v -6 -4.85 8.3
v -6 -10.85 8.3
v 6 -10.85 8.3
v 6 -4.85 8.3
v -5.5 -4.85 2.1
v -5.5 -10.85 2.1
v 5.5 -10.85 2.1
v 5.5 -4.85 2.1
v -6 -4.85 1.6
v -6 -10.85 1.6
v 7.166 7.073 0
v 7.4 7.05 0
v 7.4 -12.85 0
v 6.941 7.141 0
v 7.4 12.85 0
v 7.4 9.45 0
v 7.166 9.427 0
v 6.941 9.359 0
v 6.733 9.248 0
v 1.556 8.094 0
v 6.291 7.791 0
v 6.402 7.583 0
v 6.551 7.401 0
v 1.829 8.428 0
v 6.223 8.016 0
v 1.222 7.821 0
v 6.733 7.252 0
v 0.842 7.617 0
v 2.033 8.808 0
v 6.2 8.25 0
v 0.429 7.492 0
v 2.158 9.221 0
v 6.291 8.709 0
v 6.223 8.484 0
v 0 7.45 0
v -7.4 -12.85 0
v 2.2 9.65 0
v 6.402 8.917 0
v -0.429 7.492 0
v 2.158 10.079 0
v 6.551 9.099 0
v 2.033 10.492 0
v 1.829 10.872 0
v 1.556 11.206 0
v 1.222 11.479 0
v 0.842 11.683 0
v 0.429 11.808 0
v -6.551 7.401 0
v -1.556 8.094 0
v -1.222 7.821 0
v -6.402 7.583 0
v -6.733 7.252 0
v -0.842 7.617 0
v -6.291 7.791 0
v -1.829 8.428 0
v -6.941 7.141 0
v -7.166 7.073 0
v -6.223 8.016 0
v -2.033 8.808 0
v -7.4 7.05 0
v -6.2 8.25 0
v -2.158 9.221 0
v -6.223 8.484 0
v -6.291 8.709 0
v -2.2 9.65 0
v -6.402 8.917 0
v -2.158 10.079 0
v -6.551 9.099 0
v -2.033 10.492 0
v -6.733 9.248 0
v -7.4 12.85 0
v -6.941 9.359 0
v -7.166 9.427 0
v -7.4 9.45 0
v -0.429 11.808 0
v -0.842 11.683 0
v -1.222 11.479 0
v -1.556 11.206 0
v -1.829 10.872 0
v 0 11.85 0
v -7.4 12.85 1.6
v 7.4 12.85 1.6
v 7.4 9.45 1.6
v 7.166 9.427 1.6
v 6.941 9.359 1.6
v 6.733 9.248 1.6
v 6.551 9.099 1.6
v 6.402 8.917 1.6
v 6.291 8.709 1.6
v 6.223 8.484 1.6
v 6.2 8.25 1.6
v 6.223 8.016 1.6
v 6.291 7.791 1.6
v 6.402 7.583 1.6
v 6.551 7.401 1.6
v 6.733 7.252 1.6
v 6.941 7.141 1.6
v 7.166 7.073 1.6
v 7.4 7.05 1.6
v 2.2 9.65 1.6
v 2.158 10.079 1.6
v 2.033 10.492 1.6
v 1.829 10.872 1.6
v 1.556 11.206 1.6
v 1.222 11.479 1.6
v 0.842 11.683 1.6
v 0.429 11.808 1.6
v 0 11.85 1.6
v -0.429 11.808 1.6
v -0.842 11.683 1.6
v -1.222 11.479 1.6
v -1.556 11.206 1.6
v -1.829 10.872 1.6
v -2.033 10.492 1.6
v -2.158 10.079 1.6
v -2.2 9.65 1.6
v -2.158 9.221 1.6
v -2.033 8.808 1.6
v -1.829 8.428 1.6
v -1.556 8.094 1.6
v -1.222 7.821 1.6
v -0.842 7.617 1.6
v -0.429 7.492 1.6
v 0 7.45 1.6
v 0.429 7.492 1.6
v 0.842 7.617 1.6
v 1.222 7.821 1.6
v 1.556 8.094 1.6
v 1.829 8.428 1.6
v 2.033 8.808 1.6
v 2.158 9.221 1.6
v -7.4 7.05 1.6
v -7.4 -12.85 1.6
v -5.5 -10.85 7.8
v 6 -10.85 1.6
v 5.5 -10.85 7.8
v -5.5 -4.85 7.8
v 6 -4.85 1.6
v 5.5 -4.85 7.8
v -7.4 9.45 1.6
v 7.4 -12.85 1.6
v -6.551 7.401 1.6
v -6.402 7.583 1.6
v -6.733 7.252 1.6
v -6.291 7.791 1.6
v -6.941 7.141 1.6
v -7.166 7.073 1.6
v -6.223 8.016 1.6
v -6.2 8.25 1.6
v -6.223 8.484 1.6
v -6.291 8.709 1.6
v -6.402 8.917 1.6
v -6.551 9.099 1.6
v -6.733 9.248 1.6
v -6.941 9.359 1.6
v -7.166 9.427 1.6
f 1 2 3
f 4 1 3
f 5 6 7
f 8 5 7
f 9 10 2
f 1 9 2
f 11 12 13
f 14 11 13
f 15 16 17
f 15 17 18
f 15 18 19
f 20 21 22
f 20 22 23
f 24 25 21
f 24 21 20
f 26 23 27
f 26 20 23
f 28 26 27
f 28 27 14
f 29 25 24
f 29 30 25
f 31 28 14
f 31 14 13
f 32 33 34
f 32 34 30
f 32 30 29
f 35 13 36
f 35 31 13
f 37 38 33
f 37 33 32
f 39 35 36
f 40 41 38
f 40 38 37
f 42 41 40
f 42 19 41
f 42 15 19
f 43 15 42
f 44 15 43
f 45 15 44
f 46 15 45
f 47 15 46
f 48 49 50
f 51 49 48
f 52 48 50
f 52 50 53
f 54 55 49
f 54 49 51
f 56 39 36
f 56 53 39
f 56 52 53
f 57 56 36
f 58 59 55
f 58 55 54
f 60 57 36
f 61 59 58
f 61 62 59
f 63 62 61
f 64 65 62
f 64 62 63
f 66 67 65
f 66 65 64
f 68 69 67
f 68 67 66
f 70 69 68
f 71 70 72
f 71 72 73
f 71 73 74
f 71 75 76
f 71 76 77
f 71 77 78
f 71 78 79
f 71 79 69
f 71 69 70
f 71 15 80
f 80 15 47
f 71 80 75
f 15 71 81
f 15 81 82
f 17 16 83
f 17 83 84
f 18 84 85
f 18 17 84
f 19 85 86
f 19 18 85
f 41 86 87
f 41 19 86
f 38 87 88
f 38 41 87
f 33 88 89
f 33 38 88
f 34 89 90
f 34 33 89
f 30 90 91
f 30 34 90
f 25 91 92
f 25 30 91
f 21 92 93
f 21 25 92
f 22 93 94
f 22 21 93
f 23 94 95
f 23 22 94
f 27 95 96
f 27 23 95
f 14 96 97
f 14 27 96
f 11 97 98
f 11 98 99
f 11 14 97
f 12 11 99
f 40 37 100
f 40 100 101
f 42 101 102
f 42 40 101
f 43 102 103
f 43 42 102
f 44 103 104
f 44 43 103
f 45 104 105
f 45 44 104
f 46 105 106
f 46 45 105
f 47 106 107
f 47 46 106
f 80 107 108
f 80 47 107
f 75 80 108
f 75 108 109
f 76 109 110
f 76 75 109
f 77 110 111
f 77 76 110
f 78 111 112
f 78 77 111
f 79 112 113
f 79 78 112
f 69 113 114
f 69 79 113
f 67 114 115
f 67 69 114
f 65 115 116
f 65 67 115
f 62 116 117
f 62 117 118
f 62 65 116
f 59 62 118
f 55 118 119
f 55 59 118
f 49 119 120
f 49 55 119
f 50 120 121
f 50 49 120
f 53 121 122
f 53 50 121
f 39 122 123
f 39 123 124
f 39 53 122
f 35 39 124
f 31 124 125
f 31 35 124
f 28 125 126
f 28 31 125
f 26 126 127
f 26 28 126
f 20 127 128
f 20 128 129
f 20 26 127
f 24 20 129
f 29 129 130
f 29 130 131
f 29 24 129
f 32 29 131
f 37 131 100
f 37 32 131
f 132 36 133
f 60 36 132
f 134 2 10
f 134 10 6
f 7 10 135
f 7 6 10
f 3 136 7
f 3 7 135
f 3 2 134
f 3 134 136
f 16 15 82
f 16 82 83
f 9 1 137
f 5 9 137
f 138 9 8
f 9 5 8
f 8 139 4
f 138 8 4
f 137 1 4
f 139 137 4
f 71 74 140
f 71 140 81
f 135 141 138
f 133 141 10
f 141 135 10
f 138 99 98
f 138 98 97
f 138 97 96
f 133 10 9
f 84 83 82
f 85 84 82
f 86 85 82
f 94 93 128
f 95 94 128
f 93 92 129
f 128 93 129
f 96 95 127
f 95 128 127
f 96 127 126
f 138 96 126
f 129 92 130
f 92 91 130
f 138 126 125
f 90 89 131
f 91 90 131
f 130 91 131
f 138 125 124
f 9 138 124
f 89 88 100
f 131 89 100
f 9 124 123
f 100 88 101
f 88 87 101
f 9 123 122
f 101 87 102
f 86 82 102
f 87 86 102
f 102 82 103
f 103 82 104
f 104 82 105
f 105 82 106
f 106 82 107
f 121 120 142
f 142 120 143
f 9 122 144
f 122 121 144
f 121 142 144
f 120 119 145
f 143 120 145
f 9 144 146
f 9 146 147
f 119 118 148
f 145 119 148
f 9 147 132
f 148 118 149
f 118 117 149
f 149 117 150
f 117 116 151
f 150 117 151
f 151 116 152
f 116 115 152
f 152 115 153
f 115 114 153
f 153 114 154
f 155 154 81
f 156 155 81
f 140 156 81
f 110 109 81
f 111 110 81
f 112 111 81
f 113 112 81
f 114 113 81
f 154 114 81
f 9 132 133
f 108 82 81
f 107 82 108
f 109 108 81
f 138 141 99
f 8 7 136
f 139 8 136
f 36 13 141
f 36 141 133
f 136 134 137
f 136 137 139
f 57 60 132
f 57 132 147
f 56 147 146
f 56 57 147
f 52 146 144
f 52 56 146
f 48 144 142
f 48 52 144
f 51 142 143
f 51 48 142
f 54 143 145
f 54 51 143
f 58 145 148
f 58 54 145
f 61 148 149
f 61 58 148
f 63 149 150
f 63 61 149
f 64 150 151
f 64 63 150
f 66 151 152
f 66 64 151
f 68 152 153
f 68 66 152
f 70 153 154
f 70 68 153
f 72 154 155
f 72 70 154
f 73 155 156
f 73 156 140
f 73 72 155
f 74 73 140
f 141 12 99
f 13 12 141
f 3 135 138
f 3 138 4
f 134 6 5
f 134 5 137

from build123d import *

# Parameters (mm, degrees)
CROQUIS1_R              = 2.2
SALIENTE_EXTRUIR1_DEPTH = 1.6
SALIENTE_EXTRUIR3_START = -2
CROQUIS3_W              = 12
CROQUIS3_H              = 6.7
CROQUIS3_W_2            = 11
CROQUIS3_H_2            = 5.7
SALIENTE_EXTRUIR3_DEPTH = 6


with BuildPart() as part:
    # Croquis1 → Saliente-Extruir1 (new body)
    with BuildSketch(Plane.XY):
        with BuildLine():
            Line((7.4, -12.85), (-7.4, -12.85))
            Line((-7.4, -12.85), (-7.4, 7.05))
            ThreePointArc((-7.4, 7.05), (-6.2, 8.25), (-7.4, 9.45))
            Line((-7.4, 9.45), (-7.4, 12.85))
            Line((-7.4, 12.85), (7.4, 12.85))
            Line((7.4, 12.85), (7.4, 9.45))
            ThreePointArc((7.4, 9.45), (6.2, 8.25), (7.4, 7.05))
            Line((7.4, 7.05), (7.4, -12.85))
        make_face()
        with Locations((0, 9.65)):
            Circle(CROQUIS1_R, mode=Mode.SUBTRACT)
    extrude(amount=SALIENTE_EXTRUIR1_DEPTH)

    # Croquis3 → Saliente-Extruir3 (add)
    with BuildSketch(Plane.XZ.offset(12.85).offset(SALIENTE_EXTRUIR3_START)):
        with Locations((0, 4.95)):
            Rectangle(CROQUIS3_W, CROQUIS3_H)
        with Locations((0, 4.95)):
            Rectangle(CROQUIS3_W_2, CROQUIS3_H_2, mode=Mode.SUBTRACT)
    extrude(amount=-SALIENTE_EXTRUIR3_DEPTH)


solid = part.part
